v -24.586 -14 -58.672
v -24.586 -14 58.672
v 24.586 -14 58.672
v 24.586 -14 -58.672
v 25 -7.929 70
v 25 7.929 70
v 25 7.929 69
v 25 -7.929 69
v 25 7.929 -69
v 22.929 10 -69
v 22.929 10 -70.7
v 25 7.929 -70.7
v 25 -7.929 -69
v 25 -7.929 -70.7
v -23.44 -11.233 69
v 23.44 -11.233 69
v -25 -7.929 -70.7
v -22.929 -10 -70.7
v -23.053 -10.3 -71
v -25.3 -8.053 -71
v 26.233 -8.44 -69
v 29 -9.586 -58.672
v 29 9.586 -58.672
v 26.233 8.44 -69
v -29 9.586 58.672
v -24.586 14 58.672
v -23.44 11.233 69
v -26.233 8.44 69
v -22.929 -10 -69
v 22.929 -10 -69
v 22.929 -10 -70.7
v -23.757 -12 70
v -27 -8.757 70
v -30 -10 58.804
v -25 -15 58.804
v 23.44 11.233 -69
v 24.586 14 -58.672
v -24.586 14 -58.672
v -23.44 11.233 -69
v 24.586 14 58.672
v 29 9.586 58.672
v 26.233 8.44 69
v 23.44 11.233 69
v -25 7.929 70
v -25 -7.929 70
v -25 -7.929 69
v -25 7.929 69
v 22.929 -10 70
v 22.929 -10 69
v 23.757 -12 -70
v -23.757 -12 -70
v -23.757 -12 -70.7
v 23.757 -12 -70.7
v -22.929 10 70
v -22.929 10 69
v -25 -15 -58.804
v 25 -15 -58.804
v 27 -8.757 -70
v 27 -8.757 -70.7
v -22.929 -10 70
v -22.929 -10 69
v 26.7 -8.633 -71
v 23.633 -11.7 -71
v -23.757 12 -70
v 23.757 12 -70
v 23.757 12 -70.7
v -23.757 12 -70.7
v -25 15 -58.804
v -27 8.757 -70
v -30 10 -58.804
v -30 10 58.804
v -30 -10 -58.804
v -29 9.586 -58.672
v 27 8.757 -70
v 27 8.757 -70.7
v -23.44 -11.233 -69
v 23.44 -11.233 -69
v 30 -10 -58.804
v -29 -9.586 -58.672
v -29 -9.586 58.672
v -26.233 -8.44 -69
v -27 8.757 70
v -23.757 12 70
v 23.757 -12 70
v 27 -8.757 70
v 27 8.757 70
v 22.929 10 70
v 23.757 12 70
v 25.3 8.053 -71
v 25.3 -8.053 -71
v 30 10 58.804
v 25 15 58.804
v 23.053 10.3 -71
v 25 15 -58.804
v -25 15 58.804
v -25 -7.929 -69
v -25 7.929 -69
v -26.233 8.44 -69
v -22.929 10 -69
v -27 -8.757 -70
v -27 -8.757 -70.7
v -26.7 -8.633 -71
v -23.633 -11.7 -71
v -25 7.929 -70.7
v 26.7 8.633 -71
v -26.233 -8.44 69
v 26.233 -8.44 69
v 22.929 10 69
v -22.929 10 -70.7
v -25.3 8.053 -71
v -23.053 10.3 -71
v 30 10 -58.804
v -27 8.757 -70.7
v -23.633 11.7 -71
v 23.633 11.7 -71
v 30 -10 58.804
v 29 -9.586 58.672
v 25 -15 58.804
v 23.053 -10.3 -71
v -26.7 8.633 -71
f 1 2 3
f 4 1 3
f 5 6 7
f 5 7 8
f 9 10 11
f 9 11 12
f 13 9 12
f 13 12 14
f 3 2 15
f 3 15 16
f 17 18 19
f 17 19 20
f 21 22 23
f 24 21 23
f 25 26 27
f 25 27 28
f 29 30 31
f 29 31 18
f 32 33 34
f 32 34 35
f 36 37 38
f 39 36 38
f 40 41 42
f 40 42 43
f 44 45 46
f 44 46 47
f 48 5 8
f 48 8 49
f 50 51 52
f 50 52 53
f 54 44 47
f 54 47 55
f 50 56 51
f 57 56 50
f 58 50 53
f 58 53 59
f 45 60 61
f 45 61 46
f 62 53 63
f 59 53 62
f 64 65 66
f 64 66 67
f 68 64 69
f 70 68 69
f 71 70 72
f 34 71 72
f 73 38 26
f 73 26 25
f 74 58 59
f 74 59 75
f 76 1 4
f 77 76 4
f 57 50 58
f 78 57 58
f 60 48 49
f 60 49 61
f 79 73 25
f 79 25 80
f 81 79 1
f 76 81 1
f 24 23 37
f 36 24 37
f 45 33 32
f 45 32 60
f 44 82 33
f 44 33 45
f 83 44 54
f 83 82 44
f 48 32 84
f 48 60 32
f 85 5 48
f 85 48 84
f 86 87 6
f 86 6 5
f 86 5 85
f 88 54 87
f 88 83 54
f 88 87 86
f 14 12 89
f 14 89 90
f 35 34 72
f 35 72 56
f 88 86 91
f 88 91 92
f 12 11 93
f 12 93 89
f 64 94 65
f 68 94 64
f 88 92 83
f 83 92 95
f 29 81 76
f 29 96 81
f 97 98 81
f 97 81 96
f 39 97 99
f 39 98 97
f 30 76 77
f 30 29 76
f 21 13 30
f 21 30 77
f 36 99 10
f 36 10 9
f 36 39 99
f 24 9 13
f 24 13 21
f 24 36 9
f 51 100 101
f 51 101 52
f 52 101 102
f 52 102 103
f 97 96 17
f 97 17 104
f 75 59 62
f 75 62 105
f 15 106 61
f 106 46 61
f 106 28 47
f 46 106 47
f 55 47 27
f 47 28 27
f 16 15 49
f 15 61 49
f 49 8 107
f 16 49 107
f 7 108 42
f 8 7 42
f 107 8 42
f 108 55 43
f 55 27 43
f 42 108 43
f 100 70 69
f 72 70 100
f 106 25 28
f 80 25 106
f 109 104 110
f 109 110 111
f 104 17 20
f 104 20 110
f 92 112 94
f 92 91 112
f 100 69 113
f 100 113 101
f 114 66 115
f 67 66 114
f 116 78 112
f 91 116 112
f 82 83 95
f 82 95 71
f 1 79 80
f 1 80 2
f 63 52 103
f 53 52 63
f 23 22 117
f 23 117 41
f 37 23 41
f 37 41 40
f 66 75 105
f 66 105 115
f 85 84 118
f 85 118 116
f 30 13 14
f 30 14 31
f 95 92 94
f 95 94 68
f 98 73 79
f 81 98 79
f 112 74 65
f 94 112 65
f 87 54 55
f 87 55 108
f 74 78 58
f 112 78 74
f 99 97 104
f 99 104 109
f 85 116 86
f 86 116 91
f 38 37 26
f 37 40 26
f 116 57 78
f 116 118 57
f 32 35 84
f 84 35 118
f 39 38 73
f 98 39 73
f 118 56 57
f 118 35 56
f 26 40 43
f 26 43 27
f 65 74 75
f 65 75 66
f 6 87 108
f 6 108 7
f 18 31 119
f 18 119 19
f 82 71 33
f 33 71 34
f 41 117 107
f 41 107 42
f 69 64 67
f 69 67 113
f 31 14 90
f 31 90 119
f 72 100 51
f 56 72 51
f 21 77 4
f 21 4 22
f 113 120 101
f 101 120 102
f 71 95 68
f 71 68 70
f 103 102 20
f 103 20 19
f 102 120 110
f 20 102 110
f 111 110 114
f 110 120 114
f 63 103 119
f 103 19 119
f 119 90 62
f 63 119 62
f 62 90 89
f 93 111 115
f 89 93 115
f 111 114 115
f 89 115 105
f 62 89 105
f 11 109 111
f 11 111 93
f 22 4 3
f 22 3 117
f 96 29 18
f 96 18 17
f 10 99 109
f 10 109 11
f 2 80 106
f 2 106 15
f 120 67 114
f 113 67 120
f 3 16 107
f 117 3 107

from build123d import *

# Parameters (mm, degrees)
F1_DEPTH = 70
F2_SIZE2 = 11.1961524227
F2_SIZE  = 3
F4_T     = -1
F5_DEPTH = 1
F6_SIZE  = 0.3


with BuildPart() as f1:
    # F0 (on Top) → F1 (new body)
    with BuildSketch(Plane.XY):
        Polygon((30, 10), (25, 15), (-25, 15), (-30, 10), (-30, -10), (-25, -15), (25, -15), (30, -10), align=None)
        Polygon((-22.9289321881, 10), (22.9289321881, 10), (25, 7.9289321881), (25, -7.9289321881), (22.9289321881, -10), (-22.9289321881, -10), (-25, -7.9289321881), (-25, 7.9289321881), align=None, mode=Mode.SUBTRACT)
    extrude(amount=F1_DEPTH)

    # F2
    f2_edges = [f1.edges().sort_by_distance(p)[0] for p in [
        (-30, 0, 70),
        (-27.5, -12.5, 70),
        (0, -15, 70),
        (27.5, -12.5, 70),
        (30, 0, 70),
        (27.5, 12.5, 70),
        (0, 15, 70),
        (-27.5, 12.5, 70),
    ]]
    f2_side = f1.faces().sort_by_distance((27.025658, 12.025658, 70))[0]
    chamfer(f2_edges, length=F2_SIZE, length2=F2_SIZE2, reference=f2_side)

    # F3: F1 across face


with BuildPart() as f1_1:
    add(f1.part)
    add(f1.part.mirror(Plane(origin=(0, 0, 0), x_dir=(1, 0, 0), z_dir=(0, 0, -1))))

    # F4
    f4_openings = [f1_1.faces().sort_by_distance(p)[0] for p in [
        (-25, 0, 0),
        (-23.964466, 8.964466, 0),
        (0, 10, 0),
        (23.964466, 8.964466, 0),
        (25, 0, 0),
        (0, -10, 0),
        (-23.964466, -8.964466, 0),
        (23.964466, -8.964466, 0),
    ]]
    offset(amount=F4_T, openings=f4_openings)

    # F5 (add): a face of the model
    f5_faces = [f1_1.faces().sort_by_distance(p)[0] for p in [
        (-26.4090685319, 0, -70),
    ]]
    extrude(f5_faces, amount=F5_DEPTH)

    # F6
    f6_edges = [f1_1.edges().sort_by_distance(p)[0] for p in [
        (-27, 0, -71),
        (-25.37868, 10.37868, -71),
        (-25.37868, -10.37868, -71),
        (0, 12, -71),
        (0, -12, -71),
        (25.37868, 10.37868, -71),
        (25.37868, -10.37868, -71),
        (27, 0, -71),
        (0, 10, -71),
        (23.964466, 8.964466, -71),
        (25, 0, -71),
        (23.964466, -8.964466, -71),
        (0, -10, -71),
        (-23.964466, -8.964466, -71),
        (-25, 0, -71),
        (-23.964466, 8.964466, -71),
    ]]
    chamfer(f6_edges, length=F6_SIZE)


solid = f1_1.part
